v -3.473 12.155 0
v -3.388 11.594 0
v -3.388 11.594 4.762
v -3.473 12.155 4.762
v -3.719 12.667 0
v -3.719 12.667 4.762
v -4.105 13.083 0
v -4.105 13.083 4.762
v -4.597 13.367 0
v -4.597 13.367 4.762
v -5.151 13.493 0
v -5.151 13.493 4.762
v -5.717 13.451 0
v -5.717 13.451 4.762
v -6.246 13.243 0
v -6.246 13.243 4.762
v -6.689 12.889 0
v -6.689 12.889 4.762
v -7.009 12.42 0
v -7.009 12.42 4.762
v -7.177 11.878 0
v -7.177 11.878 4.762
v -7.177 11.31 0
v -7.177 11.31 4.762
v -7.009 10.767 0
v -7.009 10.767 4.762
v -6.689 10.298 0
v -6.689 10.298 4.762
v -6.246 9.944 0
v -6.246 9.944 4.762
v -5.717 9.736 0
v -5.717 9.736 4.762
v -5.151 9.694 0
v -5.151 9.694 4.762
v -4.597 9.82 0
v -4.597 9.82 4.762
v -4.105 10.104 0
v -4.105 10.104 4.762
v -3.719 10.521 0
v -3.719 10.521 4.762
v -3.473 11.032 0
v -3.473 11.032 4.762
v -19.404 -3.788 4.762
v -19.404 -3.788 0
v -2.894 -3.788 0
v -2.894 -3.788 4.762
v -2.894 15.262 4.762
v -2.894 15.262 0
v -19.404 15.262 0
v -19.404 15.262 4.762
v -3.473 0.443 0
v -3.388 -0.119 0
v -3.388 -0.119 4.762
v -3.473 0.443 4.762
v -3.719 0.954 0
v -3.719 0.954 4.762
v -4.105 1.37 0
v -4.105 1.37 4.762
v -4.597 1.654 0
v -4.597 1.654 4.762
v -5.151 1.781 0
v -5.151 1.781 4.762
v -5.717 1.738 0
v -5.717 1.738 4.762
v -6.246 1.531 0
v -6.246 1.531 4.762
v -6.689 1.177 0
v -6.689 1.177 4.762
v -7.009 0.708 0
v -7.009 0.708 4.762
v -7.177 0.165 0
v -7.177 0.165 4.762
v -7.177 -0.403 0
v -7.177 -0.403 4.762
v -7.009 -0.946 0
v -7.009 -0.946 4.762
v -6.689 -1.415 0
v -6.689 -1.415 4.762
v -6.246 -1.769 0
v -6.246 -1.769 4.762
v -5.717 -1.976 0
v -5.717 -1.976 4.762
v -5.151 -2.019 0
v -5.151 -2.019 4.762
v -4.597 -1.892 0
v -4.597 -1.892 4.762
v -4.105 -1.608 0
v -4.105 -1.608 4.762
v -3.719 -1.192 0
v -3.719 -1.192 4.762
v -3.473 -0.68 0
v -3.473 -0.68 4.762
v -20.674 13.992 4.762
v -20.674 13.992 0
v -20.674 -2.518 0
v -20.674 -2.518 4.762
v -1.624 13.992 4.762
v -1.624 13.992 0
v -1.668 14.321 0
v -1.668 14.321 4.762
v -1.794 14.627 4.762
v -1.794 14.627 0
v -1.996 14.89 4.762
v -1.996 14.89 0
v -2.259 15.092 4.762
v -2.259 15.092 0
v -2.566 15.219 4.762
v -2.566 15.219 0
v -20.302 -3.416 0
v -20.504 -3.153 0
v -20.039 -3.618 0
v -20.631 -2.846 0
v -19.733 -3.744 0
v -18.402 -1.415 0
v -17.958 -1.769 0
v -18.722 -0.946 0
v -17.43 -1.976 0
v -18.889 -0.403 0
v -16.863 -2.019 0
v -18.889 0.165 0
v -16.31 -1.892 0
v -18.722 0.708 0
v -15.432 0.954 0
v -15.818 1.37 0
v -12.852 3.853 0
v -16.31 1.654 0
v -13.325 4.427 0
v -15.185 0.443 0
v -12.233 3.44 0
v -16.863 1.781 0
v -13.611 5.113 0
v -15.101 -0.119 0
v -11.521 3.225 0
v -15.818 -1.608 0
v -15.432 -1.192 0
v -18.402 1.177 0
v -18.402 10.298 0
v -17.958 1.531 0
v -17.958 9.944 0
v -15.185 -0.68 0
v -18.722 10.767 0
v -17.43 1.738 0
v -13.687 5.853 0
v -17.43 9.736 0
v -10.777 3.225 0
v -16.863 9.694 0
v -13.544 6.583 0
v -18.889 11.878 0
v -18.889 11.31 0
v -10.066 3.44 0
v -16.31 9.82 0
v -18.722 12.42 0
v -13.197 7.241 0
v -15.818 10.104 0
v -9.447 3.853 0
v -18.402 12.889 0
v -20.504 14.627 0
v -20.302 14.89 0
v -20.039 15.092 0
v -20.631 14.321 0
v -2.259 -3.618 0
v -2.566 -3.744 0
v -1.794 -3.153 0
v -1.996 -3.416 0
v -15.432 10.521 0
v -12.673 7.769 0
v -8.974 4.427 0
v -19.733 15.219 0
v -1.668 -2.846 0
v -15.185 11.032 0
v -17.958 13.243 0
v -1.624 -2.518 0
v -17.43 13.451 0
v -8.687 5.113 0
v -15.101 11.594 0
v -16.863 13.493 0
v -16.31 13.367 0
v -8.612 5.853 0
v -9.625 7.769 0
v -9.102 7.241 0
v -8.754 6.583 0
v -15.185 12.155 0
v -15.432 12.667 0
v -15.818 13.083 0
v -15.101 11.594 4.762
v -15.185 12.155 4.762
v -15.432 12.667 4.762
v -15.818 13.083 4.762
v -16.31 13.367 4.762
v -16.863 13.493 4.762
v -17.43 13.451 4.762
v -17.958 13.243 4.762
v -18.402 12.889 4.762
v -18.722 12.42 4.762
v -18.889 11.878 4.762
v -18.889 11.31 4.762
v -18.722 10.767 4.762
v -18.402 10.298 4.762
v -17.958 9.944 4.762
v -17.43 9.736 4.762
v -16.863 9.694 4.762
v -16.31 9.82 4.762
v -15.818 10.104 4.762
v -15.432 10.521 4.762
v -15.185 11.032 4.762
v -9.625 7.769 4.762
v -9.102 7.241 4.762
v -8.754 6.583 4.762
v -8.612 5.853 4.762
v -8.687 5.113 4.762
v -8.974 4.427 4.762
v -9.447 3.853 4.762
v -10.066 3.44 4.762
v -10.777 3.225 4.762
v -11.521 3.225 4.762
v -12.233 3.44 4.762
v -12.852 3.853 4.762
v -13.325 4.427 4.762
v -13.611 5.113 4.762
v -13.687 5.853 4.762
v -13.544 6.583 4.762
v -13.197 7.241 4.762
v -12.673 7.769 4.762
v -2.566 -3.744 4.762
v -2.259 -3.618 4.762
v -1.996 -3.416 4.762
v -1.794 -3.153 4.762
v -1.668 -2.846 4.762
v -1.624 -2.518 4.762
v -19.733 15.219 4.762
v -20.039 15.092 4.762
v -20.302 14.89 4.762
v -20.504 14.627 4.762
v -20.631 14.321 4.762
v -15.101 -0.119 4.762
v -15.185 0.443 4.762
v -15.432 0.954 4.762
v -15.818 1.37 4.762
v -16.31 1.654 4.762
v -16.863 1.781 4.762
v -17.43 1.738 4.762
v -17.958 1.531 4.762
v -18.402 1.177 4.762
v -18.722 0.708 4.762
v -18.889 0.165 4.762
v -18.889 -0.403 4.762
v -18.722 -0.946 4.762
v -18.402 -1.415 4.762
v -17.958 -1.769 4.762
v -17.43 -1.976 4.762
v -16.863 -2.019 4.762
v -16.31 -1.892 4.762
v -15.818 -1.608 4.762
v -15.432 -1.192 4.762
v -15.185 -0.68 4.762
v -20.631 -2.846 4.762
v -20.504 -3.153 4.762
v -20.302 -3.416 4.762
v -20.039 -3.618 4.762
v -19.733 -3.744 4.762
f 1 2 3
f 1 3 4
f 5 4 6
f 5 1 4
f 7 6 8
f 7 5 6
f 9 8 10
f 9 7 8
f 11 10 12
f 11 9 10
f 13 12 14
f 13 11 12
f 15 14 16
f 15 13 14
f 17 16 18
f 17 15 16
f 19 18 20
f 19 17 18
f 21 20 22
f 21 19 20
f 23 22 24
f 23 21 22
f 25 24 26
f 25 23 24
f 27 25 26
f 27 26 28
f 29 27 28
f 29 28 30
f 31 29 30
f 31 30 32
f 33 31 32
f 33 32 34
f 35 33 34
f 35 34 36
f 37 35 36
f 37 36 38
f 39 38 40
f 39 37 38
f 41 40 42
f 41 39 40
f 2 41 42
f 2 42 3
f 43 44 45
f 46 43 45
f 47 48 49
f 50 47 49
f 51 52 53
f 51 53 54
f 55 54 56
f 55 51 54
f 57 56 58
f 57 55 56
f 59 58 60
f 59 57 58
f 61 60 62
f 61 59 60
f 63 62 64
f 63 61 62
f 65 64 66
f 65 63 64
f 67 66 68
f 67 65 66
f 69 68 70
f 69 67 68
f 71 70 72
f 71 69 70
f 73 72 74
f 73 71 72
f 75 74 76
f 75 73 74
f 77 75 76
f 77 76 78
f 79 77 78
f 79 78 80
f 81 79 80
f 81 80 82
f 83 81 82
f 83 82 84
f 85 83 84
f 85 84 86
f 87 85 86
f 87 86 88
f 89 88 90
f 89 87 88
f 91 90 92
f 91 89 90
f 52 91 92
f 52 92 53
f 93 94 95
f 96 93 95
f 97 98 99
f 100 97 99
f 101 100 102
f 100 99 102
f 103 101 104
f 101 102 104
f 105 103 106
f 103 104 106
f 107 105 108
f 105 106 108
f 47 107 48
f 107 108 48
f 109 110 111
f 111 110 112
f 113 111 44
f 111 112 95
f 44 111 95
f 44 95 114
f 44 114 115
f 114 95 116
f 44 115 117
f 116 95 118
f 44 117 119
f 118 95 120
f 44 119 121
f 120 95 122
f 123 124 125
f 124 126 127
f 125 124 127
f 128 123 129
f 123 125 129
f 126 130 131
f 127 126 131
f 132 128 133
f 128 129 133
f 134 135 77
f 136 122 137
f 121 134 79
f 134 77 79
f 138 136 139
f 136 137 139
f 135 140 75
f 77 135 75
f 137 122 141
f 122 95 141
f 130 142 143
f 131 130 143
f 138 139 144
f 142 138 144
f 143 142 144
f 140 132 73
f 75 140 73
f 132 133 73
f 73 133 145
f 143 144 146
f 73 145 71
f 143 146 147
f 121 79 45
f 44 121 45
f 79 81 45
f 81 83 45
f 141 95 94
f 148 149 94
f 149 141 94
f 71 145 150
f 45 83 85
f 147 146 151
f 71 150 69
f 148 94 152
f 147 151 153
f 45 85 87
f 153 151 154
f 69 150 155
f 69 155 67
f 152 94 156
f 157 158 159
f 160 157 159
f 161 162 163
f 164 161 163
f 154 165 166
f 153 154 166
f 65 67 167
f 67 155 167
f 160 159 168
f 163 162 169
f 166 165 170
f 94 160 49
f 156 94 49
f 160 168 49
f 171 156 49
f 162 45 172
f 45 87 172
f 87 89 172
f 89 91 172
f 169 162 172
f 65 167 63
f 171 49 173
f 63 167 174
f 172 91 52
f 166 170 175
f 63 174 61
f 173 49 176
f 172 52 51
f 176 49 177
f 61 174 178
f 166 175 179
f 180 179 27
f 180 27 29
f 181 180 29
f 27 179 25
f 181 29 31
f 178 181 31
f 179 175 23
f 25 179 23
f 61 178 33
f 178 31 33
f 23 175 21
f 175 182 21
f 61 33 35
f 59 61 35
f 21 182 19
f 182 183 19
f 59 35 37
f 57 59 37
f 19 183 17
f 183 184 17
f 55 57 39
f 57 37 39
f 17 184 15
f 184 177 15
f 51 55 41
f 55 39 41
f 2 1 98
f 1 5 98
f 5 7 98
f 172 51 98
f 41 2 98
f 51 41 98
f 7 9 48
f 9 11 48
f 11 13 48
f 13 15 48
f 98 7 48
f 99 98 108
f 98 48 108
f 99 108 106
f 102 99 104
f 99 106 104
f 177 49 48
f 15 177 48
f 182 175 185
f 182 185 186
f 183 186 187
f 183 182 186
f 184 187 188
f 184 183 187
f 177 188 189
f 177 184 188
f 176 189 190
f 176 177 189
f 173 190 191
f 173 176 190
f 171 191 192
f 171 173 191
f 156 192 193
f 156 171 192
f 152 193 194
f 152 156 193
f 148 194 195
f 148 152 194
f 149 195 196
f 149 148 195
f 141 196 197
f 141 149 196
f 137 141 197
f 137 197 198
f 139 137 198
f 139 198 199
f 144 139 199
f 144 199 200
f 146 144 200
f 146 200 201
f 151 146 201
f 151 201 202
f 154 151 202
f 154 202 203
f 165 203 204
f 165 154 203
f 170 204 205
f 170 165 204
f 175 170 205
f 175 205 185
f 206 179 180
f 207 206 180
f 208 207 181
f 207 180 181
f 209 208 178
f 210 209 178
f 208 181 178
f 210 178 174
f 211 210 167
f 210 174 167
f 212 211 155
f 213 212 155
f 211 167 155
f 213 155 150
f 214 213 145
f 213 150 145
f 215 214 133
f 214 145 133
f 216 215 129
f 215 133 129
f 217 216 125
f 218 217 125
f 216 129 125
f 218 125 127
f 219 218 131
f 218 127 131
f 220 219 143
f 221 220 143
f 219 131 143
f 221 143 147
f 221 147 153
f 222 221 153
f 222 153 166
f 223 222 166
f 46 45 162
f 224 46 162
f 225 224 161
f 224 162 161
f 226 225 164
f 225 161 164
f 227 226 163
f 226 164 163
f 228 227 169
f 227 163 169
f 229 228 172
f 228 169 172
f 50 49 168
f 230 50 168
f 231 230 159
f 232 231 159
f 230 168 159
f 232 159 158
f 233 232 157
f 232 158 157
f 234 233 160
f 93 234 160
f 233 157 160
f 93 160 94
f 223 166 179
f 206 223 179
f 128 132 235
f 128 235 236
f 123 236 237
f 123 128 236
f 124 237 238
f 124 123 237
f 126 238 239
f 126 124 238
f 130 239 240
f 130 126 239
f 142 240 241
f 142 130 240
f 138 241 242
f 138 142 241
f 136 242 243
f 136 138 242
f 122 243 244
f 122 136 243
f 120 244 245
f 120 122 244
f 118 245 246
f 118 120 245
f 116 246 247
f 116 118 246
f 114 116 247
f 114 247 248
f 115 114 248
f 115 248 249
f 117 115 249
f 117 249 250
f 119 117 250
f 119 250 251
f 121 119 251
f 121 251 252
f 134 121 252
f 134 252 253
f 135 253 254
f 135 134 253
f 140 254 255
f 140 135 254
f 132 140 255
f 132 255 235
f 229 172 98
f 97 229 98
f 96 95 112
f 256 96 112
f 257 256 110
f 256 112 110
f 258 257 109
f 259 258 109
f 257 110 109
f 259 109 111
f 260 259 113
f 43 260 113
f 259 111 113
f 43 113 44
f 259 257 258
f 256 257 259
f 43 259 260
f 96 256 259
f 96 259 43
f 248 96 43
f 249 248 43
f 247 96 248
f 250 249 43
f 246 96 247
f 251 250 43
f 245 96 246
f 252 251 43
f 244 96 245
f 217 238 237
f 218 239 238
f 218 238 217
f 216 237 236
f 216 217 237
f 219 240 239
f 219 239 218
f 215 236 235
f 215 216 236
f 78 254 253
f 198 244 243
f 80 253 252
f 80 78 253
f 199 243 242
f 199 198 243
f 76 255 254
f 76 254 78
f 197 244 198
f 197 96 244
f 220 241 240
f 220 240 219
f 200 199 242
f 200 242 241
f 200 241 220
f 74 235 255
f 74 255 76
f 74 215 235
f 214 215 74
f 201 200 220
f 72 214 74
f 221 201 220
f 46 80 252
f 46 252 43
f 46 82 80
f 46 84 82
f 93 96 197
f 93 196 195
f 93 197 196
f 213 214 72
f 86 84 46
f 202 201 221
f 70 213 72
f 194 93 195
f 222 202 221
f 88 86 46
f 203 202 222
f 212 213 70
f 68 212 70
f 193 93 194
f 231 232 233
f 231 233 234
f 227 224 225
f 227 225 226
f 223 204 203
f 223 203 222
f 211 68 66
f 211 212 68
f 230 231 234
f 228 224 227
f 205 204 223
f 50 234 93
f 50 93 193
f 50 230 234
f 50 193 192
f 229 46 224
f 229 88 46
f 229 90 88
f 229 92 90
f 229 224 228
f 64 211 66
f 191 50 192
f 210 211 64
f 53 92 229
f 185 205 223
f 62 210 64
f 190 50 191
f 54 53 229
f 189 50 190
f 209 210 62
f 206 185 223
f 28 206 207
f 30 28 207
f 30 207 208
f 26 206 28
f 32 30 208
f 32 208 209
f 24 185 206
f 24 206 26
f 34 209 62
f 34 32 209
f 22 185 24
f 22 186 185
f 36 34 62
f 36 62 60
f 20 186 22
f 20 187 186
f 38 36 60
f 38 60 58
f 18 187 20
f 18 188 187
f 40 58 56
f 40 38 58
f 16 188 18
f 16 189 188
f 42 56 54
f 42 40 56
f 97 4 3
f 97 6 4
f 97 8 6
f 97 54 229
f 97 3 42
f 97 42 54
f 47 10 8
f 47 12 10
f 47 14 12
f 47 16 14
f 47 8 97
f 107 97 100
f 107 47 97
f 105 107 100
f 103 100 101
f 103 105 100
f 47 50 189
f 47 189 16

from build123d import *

# Parameters (mm, degrees)
SKETCH2_R           = 1.905
BOSS_EXTRUDE1_DEPTH = 4.7625


with BuildPart() as part:
    # Sketch2 → Boss-Extrude1 (new body)
    with BuildSketch(Plane.XY):
        with BuildLine():
            Line((-19.404343504, -3.787653884), (-2.894343504, -3.787653884))
            ThreePointArc((-2.894343504, -3.787653884), (-1.996317892, -3.415679496), (-1.624343504, -2.517653884))
            Line((-1.624343504, -2.517653884), (-1.624343504, 13.992346116))
            ThreePointArc((-1.624343504, 13.992346116), (-1.996317892, 14.890371728), (-2.894343504, 15.262346116))
            Line((-2.894343504, 15.262346116), (-19.404343504, 15.262346116))
            ThreePointArc((-19.404343504, 15.262346116), (-20.302369116, 14.890371728), (-20.674343504, 13.992346116))
            Line((-20.674343504, 13.992346116), (-20.674343504, -2.517653884))
            ThreePointArc((-20.674343504, -2.517653884), (-20.302369116, -3.415679496), (-19.404343504, -3.787653884))
        make_face()
        with Locations((-17.005652309, 11.593654921)):
            Circle(SKETCH2_R, mode=Mode.SUBTRACT)
        with Locations((-5.2930347, 11.593654921)):
            Circle(SKETCH2_R, mode=Mode.SUBTRACT)
        with Locations((-5.2930347, -0.118962689)):
            Circle(SKETCH2_R, mode=Mode.SUBTRACT)
        with Locations((-17.005652309, -0.118962689)):
            Circle(SKETCH2_R, mode=Mode.SUBTRACT)
        with BuildLine():
            Line((-12.673343504, 7.769346116), (-9.625343504, 7.769346116))
            ThreePointArc((-9.625343504, 7.769346116), (-11.149343504, 3.197346116), (-12.673343504, 7.769346116))
        make_face(mode=Mode.SUBTRACT)
    extrude(amount=BOSS_EXTRUDE1_DEPTH)


solid = part.part
